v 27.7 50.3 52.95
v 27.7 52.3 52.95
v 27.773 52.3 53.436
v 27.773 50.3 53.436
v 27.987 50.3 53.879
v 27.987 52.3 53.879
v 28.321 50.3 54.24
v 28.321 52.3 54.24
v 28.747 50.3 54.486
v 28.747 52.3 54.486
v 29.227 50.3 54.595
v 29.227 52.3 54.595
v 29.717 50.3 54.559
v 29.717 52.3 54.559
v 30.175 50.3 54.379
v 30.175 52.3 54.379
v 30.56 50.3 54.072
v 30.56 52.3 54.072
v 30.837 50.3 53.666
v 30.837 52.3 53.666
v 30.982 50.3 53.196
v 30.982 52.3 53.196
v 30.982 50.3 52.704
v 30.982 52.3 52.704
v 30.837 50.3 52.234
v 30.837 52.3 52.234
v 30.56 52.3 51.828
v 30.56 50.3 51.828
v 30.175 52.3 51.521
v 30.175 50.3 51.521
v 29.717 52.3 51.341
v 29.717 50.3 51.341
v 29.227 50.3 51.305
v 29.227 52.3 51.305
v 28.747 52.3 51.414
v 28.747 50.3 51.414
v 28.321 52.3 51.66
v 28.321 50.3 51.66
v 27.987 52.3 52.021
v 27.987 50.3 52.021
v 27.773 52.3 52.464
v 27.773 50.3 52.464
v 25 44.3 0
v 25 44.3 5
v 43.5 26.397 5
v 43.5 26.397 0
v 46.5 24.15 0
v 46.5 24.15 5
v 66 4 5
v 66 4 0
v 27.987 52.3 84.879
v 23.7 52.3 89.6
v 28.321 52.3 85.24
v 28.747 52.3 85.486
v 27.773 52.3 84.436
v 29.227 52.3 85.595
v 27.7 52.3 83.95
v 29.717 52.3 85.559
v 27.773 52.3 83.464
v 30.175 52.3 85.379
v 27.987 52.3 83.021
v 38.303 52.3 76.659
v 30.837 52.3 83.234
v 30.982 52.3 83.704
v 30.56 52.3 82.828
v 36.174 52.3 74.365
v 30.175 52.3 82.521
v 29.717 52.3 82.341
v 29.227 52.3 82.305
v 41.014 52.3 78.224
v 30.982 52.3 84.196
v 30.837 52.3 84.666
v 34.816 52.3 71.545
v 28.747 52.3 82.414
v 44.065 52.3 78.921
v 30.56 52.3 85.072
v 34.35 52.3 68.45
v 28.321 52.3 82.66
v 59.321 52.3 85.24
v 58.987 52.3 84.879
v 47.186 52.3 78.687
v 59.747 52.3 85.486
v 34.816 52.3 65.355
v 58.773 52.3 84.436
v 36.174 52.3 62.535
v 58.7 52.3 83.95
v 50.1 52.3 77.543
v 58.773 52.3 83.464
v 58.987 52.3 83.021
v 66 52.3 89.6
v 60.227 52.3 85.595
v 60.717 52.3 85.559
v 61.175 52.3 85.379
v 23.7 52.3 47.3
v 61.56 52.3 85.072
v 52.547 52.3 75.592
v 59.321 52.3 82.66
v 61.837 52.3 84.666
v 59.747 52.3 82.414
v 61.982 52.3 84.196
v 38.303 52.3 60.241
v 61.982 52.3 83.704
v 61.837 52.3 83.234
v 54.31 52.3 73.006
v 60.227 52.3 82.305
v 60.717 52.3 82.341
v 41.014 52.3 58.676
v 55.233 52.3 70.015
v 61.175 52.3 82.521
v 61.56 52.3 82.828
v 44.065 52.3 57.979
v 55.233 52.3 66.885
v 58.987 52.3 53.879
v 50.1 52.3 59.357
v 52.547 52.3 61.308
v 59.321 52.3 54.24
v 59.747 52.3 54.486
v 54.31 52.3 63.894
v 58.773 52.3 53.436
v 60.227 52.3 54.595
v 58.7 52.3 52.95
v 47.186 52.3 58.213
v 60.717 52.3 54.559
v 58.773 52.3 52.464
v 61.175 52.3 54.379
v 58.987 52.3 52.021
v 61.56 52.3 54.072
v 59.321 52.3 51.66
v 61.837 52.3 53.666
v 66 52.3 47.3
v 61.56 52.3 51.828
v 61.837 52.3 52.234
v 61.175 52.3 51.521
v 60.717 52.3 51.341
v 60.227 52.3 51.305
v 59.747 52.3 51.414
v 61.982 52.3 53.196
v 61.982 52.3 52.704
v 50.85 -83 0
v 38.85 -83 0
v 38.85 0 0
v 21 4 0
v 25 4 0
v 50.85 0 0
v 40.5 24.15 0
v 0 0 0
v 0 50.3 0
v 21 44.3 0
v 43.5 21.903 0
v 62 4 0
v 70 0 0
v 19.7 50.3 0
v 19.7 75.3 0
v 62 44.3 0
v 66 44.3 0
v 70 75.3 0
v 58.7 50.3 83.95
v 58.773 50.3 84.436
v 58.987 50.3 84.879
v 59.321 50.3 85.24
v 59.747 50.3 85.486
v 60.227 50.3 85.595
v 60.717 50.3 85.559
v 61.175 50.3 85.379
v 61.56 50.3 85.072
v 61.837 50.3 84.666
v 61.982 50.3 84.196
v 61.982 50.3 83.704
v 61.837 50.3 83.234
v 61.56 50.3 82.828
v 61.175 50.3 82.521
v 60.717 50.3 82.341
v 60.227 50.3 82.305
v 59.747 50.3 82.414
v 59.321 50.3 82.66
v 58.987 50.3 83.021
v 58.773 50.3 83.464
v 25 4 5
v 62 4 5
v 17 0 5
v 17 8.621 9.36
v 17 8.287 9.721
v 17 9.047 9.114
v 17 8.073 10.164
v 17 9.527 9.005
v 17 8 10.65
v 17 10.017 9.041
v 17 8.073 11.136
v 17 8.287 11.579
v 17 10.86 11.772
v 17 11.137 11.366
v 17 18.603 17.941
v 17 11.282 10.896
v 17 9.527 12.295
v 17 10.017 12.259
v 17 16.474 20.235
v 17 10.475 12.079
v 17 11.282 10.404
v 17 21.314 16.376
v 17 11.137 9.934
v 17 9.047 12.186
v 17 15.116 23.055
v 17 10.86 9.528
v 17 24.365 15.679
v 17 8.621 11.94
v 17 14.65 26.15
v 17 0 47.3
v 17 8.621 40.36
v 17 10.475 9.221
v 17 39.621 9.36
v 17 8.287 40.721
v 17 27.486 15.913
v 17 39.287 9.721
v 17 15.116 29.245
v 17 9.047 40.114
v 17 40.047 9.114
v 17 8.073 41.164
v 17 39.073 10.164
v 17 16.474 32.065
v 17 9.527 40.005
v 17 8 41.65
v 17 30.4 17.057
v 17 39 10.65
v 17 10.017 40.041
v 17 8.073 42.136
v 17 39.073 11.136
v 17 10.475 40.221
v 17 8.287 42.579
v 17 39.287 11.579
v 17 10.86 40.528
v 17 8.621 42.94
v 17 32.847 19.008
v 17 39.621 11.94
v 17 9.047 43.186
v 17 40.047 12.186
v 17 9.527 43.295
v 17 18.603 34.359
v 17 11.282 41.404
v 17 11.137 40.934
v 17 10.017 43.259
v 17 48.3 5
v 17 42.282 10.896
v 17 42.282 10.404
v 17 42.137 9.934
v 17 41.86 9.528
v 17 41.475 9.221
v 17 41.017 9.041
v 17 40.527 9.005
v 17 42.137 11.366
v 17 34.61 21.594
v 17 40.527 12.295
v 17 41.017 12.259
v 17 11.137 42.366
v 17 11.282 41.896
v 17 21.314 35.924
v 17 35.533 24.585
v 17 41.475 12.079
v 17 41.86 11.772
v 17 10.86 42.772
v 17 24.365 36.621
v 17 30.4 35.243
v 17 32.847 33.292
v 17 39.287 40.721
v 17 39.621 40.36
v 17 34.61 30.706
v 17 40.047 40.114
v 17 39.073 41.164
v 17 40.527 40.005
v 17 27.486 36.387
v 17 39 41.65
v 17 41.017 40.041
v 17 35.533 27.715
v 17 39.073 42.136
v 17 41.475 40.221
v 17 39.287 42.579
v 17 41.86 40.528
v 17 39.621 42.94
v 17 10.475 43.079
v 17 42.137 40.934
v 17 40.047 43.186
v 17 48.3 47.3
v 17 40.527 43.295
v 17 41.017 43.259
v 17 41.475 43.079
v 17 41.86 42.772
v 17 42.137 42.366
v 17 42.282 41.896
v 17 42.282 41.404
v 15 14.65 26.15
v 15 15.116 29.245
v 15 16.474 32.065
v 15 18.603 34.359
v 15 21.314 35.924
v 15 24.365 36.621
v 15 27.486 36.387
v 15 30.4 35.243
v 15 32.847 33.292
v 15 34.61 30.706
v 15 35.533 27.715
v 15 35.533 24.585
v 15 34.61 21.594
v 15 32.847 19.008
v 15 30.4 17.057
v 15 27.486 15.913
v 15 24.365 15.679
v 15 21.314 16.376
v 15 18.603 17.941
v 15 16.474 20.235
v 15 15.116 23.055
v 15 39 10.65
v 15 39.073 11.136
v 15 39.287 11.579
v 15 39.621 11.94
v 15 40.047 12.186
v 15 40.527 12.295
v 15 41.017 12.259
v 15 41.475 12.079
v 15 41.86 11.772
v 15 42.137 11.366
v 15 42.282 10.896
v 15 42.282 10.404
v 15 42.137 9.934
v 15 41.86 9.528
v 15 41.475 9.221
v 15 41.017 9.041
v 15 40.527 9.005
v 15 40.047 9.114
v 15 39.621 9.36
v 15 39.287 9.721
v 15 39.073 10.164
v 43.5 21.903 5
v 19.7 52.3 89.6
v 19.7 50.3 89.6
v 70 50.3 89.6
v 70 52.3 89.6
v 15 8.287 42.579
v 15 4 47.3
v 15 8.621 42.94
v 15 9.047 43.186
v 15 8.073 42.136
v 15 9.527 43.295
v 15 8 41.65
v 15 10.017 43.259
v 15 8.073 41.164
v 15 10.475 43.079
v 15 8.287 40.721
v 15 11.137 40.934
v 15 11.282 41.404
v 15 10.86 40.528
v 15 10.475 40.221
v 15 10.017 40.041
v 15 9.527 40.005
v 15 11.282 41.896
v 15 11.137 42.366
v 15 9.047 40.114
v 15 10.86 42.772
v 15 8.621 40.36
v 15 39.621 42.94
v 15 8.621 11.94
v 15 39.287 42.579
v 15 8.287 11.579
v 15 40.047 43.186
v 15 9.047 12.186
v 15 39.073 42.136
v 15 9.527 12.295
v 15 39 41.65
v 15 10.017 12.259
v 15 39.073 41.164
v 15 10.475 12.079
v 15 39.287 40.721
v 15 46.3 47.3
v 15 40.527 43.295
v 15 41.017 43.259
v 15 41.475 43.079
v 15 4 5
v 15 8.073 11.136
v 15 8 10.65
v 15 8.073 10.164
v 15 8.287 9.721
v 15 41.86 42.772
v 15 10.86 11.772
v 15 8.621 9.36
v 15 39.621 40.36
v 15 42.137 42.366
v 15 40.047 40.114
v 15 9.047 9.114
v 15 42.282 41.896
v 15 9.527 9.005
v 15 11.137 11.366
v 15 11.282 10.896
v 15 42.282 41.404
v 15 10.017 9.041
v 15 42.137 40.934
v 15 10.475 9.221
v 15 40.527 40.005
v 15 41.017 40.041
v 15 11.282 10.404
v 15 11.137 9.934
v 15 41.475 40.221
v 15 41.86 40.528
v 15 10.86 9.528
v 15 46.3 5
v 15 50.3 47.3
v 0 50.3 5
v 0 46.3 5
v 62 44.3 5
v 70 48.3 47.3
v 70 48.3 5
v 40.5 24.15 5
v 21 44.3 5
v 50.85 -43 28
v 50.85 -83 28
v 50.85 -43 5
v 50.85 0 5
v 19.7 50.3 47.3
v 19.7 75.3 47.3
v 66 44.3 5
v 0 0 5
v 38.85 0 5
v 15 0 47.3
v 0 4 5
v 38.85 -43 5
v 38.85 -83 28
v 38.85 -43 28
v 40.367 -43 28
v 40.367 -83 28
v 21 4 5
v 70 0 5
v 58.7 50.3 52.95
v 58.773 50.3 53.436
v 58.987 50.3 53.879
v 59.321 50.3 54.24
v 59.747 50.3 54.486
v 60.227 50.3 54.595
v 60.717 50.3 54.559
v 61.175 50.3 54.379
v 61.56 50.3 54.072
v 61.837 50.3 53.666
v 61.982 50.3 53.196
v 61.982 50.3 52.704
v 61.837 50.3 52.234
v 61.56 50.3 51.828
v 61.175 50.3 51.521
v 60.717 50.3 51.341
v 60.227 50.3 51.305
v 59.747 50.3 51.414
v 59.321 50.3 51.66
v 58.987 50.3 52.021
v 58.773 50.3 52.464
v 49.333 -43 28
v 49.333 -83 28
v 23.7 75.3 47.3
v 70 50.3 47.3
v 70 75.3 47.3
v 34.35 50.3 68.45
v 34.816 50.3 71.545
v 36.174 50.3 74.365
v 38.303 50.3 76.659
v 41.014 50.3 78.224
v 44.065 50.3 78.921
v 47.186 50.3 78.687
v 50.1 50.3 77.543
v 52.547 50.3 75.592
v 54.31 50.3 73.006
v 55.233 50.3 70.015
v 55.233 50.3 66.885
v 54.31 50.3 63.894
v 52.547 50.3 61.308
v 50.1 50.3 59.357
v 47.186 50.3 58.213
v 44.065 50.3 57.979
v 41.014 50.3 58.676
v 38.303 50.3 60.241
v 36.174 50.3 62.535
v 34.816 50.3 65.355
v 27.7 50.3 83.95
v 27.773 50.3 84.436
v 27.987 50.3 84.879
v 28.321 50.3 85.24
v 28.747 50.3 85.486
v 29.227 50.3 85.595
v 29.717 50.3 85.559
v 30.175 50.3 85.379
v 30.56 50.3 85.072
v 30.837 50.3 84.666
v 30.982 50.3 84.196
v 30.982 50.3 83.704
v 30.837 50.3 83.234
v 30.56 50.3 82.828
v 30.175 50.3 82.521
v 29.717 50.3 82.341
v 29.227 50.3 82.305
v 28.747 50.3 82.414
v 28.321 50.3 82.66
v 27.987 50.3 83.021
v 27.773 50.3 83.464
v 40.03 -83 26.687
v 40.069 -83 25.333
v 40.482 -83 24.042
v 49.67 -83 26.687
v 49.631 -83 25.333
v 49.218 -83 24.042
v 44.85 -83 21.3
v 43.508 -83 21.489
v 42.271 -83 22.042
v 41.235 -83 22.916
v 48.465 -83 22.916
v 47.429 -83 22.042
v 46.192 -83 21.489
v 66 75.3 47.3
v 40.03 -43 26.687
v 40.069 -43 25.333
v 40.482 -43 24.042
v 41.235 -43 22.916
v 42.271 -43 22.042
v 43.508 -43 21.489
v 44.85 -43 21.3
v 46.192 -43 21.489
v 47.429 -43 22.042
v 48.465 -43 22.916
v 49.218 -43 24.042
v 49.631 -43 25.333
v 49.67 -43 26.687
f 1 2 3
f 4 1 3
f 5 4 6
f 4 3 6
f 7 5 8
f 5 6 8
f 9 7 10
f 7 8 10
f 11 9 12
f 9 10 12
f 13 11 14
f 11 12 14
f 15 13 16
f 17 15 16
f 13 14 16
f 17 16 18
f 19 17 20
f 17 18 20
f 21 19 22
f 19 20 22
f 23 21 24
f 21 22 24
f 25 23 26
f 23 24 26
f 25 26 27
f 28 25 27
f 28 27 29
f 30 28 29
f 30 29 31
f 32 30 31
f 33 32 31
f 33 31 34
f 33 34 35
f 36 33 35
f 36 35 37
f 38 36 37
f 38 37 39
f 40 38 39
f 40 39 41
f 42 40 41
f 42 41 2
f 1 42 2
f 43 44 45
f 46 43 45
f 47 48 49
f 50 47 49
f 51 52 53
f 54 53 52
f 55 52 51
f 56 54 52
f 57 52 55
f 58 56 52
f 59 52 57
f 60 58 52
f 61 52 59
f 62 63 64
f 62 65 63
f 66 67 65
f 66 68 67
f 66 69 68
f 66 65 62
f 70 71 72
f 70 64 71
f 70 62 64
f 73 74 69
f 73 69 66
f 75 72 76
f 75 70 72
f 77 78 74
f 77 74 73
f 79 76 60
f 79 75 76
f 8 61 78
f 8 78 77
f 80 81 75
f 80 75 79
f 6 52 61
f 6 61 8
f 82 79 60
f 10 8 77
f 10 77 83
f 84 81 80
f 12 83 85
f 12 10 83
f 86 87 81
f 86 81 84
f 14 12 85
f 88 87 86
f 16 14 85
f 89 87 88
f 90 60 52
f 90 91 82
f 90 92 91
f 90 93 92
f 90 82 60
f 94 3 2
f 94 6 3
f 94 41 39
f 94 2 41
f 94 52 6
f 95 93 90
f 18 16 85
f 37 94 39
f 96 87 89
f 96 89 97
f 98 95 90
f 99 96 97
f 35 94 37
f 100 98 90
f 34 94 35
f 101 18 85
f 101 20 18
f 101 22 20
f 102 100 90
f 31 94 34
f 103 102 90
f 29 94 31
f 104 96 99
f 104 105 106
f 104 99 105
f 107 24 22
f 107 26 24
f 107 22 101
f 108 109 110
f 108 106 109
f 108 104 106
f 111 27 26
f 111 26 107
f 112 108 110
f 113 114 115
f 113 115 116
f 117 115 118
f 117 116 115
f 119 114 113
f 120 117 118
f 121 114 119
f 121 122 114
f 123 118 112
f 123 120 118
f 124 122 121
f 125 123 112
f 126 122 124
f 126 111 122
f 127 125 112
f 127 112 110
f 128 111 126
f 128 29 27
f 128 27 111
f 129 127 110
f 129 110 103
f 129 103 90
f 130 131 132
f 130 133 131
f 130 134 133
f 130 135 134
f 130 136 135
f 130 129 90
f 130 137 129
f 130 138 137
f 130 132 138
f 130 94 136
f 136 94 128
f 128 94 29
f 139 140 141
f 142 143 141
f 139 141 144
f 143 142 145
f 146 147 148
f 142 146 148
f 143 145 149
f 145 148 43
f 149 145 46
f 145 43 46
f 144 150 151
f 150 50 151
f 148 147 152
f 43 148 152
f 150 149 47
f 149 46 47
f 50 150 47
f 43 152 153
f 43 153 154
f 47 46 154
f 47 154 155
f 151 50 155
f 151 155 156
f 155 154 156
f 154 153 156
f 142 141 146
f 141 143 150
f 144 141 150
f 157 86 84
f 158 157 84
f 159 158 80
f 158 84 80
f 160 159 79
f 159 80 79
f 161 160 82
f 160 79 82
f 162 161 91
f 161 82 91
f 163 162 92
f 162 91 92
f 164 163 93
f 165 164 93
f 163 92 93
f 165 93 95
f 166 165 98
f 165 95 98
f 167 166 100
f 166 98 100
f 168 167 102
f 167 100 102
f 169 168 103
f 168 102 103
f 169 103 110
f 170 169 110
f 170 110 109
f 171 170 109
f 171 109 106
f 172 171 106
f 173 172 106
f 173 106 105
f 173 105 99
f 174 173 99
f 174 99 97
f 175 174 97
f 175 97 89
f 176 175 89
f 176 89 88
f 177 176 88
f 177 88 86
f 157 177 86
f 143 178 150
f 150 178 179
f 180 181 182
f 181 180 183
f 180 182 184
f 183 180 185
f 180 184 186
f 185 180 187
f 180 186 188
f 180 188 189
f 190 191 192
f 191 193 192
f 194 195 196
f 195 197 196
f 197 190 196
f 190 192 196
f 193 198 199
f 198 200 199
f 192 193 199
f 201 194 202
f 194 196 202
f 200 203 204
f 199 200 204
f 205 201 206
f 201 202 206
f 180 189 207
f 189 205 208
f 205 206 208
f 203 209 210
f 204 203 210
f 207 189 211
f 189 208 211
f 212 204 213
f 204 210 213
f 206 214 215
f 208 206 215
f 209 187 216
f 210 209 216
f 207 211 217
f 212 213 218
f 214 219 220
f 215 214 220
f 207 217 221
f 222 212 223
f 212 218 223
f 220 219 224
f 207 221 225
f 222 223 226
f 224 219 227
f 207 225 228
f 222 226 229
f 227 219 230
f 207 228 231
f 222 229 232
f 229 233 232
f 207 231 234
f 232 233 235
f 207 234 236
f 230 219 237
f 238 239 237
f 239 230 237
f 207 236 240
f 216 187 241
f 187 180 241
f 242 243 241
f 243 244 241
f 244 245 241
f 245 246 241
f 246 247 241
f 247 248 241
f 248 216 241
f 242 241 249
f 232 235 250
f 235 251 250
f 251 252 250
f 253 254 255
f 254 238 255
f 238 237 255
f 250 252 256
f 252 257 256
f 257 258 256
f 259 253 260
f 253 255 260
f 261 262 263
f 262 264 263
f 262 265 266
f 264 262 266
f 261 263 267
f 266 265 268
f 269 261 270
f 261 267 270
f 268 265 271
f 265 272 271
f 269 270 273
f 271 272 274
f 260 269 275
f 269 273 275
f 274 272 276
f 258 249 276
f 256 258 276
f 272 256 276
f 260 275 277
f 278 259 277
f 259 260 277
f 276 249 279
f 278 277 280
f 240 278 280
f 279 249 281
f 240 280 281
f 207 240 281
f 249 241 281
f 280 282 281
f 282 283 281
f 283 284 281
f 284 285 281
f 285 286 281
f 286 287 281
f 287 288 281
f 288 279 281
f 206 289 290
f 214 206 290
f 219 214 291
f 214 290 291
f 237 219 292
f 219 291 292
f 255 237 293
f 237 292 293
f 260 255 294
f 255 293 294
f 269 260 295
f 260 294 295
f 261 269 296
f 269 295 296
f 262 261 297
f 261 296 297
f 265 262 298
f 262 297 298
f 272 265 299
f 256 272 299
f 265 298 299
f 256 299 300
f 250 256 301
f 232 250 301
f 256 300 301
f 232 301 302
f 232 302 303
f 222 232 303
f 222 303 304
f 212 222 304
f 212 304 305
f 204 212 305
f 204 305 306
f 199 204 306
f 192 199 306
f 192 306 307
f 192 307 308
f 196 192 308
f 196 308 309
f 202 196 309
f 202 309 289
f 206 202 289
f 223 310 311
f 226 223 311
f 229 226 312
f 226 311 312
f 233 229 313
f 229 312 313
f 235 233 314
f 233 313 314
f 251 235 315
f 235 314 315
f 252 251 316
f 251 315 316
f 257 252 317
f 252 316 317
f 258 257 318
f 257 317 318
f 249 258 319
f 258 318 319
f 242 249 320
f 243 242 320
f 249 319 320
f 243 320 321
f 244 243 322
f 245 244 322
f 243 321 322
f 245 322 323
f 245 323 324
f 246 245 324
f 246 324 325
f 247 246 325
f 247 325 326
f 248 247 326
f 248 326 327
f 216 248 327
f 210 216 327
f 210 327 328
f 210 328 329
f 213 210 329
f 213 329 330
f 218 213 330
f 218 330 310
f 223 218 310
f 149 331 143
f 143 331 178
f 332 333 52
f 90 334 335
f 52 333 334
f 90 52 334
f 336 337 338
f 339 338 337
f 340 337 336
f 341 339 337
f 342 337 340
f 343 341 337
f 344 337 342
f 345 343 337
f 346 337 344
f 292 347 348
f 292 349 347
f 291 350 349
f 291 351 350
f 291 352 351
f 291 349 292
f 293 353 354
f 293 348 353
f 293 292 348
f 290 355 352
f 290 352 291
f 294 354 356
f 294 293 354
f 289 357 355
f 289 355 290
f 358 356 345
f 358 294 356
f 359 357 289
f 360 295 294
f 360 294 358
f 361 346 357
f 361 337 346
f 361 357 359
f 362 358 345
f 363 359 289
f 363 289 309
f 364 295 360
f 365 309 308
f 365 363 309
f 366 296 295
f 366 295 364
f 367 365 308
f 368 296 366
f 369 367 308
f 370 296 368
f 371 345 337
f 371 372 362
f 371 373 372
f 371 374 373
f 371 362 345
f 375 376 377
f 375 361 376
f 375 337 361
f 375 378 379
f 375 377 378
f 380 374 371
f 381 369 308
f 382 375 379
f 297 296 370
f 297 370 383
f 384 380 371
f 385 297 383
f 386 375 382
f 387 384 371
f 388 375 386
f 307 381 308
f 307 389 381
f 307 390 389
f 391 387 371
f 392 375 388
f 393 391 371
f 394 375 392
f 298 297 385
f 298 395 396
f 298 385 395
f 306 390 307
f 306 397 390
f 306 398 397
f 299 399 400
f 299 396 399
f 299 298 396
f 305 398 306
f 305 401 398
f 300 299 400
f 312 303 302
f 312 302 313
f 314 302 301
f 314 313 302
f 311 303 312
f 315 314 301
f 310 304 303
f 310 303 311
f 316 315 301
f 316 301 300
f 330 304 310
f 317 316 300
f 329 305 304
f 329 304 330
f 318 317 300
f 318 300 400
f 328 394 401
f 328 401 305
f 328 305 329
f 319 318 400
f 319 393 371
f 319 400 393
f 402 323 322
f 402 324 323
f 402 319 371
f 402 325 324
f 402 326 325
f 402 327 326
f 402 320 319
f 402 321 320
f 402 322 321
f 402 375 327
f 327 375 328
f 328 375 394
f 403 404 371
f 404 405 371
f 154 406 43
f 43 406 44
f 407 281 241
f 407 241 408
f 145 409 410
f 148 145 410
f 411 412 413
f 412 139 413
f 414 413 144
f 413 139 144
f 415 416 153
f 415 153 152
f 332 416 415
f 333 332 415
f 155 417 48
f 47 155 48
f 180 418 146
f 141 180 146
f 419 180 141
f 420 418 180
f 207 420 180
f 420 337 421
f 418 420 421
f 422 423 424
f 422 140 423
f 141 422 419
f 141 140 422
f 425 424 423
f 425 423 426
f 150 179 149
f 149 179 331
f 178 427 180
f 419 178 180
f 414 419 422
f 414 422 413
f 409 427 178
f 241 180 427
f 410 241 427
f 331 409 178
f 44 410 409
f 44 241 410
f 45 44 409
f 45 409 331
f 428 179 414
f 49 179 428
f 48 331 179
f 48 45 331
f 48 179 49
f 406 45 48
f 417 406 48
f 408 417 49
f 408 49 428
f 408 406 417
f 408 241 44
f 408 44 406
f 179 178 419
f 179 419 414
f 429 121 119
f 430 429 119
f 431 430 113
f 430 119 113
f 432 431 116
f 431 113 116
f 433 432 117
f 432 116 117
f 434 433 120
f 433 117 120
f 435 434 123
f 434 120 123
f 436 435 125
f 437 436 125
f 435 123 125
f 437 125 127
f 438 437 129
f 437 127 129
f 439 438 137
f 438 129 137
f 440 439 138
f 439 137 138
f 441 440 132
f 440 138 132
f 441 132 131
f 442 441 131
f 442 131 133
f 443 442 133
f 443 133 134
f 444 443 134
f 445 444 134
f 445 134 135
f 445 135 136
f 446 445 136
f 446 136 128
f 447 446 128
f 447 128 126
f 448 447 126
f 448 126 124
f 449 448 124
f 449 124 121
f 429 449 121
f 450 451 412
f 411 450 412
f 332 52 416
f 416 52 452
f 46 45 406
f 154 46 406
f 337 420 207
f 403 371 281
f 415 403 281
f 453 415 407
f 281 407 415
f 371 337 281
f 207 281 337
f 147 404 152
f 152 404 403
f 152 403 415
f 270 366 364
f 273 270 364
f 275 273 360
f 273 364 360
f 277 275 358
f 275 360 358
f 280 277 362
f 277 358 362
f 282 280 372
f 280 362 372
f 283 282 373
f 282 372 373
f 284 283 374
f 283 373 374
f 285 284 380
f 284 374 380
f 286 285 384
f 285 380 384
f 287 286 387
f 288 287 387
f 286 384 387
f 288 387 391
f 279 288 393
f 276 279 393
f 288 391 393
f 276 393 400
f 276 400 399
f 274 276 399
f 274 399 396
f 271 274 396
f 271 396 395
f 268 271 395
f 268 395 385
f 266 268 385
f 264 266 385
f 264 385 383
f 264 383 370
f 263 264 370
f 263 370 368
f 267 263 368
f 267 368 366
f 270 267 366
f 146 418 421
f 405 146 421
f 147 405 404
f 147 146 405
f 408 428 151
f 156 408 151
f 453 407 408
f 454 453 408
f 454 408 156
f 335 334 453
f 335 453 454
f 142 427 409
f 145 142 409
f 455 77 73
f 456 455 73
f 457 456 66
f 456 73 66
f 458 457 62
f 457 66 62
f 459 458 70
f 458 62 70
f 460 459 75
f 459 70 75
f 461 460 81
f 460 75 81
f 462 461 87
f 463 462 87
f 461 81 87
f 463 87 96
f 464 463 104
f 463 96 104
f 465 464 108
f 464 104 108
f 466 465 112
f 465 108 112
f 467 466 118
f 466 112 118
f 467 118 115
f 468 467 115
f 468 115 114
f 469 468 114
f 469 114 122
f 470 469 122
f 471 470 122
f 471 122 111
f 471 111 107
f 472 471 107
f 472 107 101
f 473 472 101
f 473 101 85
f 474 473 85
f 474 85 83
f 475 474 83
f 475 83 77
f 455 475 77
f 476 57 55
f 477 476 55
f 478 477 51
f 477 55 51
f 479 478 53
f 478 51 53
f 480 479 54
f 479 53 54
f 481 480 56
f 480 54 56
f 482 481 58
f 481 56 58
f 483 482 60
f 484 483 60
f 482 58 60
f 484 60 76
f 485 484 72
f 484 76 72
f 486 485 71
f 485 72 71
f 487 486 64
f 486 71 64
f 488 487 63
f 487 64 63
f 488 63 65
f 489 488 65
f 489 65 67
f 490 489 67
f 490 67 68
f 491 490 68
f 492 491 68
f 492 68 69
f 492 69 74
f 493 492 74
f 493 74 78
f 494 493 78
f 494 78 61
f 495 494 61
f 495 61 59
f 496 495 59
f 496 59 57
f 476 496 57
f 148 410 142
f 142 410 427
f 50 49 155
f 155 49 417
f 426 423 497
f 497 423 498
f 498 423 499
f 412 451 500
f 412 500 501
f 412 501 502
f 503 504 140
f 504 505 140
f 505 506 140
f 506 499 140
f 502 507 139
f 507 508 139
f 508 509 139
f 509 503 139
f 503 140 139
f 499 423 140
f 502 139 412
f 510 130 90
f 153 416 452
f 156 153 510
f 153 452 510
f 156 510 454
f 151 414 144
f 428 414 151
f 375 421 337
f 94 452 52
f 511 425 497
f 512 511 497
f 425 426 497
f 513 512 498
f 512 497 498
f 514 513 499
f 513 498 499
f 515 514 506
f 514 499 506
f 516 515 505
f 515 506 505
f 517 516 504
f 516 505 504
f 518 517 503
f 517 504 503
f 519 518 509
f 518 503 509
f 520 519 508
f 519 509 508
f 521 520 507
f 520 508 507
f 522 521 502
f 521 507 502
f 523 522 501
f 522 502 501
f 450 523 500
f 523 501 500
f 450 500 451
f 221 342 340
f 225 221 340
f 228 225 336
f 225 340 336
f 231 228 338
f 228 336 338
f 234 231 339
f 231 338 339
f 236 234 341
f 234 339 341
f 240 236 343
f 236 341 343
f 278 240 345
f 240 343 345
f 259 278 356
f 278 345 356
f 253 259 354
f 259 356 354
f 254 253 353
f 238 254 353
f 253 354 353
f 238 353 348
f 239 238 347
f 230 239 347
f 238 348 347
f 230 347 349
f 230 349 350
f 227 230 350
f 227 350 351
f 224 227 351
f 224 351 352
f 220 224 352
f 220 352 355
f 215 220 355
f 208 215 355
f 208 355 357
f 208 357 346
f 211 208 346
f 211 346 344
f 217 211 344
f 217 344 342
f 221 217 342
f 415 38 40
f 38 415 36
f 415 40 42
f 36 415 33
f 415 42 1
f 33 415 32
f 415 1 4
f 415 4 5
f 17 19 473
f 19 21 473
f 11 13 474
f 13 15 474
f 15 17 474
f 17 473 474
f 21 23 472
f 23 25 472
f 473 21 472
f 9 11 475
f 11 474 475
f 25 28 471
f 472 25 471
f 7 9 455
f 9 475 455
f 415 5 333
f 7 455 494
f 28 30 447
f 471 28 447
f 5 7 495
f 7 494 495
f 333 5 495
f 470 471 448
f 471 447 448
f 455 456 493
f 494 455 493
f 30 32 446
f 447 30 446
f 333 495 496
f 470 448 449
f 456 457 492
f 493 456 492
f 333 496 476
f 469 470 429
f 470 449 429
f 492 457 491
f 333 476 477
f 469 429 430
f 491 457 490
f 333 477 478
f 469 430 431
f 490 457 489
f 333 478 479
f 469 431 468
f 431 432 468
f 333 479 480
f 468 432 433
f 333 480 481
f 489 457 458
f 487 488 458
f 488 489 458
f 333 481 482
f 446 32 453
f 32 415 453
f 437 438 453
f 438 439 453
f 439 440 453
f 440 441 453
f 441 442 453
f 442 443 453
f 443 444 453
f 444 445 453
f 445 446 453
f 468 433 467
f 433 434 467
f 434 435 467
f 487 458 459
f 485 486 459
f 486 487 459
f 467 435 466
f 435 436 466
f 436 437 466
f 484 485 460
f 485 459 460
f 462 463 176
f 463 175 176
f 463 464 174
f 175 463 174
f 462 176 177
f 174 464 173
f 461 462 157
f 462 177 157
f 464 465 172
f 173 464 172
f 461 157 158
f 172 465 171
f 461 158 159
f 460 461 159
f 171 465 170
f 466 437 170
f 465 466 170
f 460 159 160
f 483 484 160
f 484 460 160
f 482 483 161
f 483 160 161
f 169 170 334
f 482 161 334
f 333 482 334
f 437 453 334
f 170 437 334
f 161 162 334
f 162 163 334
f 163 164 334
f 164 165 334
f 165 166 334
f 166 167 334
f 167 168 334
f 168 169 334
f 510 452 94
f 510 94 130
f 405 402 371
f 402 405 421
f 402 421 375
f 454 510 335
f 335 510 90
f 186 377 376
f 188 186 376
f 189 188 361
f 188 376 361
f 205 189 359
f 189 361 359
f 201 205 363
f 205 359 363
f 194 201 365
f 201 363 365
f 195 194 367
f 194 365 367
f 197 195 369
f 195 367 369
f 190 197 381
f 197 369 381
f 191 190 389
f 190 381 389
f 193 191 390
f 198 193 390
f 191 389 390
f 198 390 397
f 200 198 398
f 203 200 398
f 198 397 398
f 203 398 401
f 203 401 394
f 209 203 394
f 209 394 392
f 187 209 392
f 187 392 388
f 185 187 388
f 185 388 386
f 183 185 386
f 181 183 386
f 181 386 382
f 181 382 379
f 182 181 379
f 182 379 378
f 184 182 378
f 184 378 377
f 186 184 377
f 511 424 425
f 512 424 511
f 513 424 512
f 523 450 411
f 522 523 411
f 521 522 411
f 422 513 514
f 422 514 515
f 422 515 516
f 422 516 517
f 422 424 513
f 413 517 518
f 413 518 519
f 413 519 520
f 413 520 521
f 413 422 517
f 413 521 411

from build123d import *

# Parameters (mm, degrees)
F0_W      = 70
F0_H      = 80
F1_DEPTH  = 5
F2_W      = 2
F2_H      = 42.3
F3_DEPTH  = 42.3
F4_R      = 1.65
F4_R_2    = 10.5
F5_DEPTH  = 25
F7_DEPTH  = 4
F9_DEPTH  = 4
F10_W     = 70
F10_H     = 29.7
F11_DEPTH = 42.3
F12_W     = 42.3
F12_H     = 2
F13_DEPTH = 42.3
F14_R     = 1.65
F14_R_2   = 10.5
F15_DEPTH = 25
F17_DEPTH = 4
F19_DEPTH = 88.9
F21_DEPTH = 4
F22_W     = 19.7
F22_H     = 29.7
F23_DEPTH = 64.9
F24_W     = 53
F24_H     = 2
F25_DEPTH = 45.92
F26_W     = 50.3
F26_H     = 4.7
F27_DEPTH = 73.2
F28_W     = 12
F28_H     = 83
F29_DEPTH = 5
F30_W     = 12
F30_H     = 40
F31_DEPTH = 23
F32_R     = 4.85
F33_DEPTH = 45.2
F35_DEPTH = 25


with BuildPart() as f1:
    # F0 (on Top) → F1 (new body)
    with BuildSketch(Plane.XY):
        with Locations((35, 40)):
            Rectangle(F0_W, F0_H)
    extrude(amount=F1_DEPTH)

    # F2 (on face) → F3 (join)
    with BuildSketch(Plane.XY.offset(5)):
        with Locations((16, 25.15)):
            Rectangle(F2_W, F2_H)
    extrude(amount=F3_DEPTH)

    # F4 (on face) → F5 (cut)
    with BuildSketch(Plane(origin=(15, 0, 0), x_dir=(0, -1, 0), z_dir=(-1, 0, 0))):
        with Locations((-40.65, 41.65)):
            Circle(F4_R)
        with Locations((-9.65, 41.65)):
            Circle(F4_R)
        with Locations((-9.65, 10.65)):
            Circle(F4_R)
        with Locations((-40.65, 10.65)):
            Circle(F4_R)
        with Locations((-25.15, 26.15)):
            Circle(F4_R_2)
    extrude(amount=-F5_DEPTH, mode=Mode.SUBTRACT)

    # F6 (on face) → F7 (join)
    with BuildSketch(Plane(origin=(0, 46.3, 0), x_dir=(-1, 0, 0), z_dir=(0, 1, 0))):
        Polygon((-17, 5), (0, 5), (-15, 47.3), (-17, 47.3), align=None)
    extrude(amount=F7_DEPTH)

    # F8 (on face) → F9 (join)
    with BuildSketch(Plane.XZ.offset(-4)):
        Polygon((17, 5), (17, 47.3), (15, 47.3), (0, 5), (15, 5), align=None)
    extrude(amount=F9_DEPTH)

    # F10 (on face) → F11 (join)
    with BuildSketch(Plane.XY.offset(5)):
        with Locations((35, 65.15)):
            Rectangle(F10_W, F10_H)
    extrude(amount=F11_DEPTH)

    # F12 (on face) → F13 (join)
    with BuildSketch(Plane.XY.offset(47.3)):
        with Locations((44.85, 51.3)):
            Rectangle(F12_W, F12_H)
    extrude(amount=F13_DEPTH)

    # F14 (on face) → F15 (cut)
    with BuildSketch(Plane(origin=(0, 52.3, 0), x_dir=(-1, 0, 0), z_dir=(0, 1, 0))):
        with Locations((-60.35, 83.95)):
            Circle(F14_R)
        with Locations((-29.35, 83.95)):
            Circle(F14_R)
        with Locations((-29.35, 52.95)):
            Circle(F14_R)
        with Locations((-60.35, 52.95)):
            Circle(F14_R)
        with Locations((-44.85, 68.45)):
            Circle(F14_R_2)
    extrude(amount=-F15_DEPTH, mode=Mode.SUBTRACT)

    # F16 (on face) → F17 (join)
    with BuildSketch(Plane.YZ.offset(66)):
        Polygon((52.3, 89.6), (50.3, 89.6), (50.3, 47.3), (75.3, 47.3), align=None)
    extrude(amount=F17_DEPTH)

    # F18 (on face) → F19 (cut)
    with BuildSketch(Plane.XZ.offset(-50.3)):
        Polygon((0, 5), (15, 47.3), (0, 47.3), align=None)
    extrude(amount=-F19_DEPTH, mode=Mode.SUBTRACT)

    # F20 (on face) → F21 (join)
    with BuildSketch(Plane(origin=(23.7, 0, 0), x_dir=(0, -1, 0), z_dir=(-1, 0, 0))):
        Polygon((-50.3, 47.3), (-50.3, 89.6), (-52.3, 89.6), (-75.3, 47.3), align=None)
    extrude(amount=F21_DEPTH)

    # F22 (on face) → F23 (cut)
    with BuildSketch(Plane.XY.offset(47.3)):
        with Locations((9.85, 65.15)):
            Rectangle(F22_W, F22_H)
    extrude(amount=-F23_DEPTH, mode=Mode.SUBTRACT)

    # F24 (on face) → F25 (join)
    with BuildSketch(Plane.XY.offset(47.3)):
        with Locations((43.5, 49.3)):
            Rectangle(F24_W, F24_H)
    extrude(amount=-F25_DEPTH)

    # F26 (on face) → F27 (cut)
    with BuildSketch(Plane.XY.offset(47.3)):
        with Locations((44.85, 77.65)):
            Rectangle(F26_W, F26_H)
    extrude(amount=-F27_DEPTH, mode=Mode.SUBTRACT)

    # F28 (on face) → F29 (join)
    with BuildSketch(Plane.XY.offset(5)):
        with Locations((44.85, -41.5)):
            Rectangle(F28_W, F28_H)
    extrude(amount=-F29_DEPTH)

    # F30 (on face) → F31 (join)
    with BuildSketch(Plane.XY.offset(5)):
        with Locations((44.85, -63)):
            Rectangle(F30_W, F30_H)
    extrude(amount=F31_DEPTH)

    # F32 (on face) → F33 (cut)
    with BuildSketch(Plane.XZ.offset(83)):
        with Locations((44.85, 26.15)):
            Circle(F32_R)
    extrude(amount=-F33_DEPTH, mode=Mode.SUBTRACT)

    # F34 (on face) → F35 (cut)
    with BuildSketch(Plane.XY.offset(5)):
        Polygon((40.5, 24.15), (21, 44.3), (21, 4), align=None)
        Polygon((66, 4), (66, 44.3), (46.5, 24.15), align=None)
        Polygon((62, 44.3), (25, 44.3), (43.5, 26.396774), align=None)
        Polygon((62, 4), (43.5, 21.903226), (25, 4), align=None)
    extrude(amount=-F35_DEPTH, mode=Mode.SUBTRACT)


solid = f1.part
